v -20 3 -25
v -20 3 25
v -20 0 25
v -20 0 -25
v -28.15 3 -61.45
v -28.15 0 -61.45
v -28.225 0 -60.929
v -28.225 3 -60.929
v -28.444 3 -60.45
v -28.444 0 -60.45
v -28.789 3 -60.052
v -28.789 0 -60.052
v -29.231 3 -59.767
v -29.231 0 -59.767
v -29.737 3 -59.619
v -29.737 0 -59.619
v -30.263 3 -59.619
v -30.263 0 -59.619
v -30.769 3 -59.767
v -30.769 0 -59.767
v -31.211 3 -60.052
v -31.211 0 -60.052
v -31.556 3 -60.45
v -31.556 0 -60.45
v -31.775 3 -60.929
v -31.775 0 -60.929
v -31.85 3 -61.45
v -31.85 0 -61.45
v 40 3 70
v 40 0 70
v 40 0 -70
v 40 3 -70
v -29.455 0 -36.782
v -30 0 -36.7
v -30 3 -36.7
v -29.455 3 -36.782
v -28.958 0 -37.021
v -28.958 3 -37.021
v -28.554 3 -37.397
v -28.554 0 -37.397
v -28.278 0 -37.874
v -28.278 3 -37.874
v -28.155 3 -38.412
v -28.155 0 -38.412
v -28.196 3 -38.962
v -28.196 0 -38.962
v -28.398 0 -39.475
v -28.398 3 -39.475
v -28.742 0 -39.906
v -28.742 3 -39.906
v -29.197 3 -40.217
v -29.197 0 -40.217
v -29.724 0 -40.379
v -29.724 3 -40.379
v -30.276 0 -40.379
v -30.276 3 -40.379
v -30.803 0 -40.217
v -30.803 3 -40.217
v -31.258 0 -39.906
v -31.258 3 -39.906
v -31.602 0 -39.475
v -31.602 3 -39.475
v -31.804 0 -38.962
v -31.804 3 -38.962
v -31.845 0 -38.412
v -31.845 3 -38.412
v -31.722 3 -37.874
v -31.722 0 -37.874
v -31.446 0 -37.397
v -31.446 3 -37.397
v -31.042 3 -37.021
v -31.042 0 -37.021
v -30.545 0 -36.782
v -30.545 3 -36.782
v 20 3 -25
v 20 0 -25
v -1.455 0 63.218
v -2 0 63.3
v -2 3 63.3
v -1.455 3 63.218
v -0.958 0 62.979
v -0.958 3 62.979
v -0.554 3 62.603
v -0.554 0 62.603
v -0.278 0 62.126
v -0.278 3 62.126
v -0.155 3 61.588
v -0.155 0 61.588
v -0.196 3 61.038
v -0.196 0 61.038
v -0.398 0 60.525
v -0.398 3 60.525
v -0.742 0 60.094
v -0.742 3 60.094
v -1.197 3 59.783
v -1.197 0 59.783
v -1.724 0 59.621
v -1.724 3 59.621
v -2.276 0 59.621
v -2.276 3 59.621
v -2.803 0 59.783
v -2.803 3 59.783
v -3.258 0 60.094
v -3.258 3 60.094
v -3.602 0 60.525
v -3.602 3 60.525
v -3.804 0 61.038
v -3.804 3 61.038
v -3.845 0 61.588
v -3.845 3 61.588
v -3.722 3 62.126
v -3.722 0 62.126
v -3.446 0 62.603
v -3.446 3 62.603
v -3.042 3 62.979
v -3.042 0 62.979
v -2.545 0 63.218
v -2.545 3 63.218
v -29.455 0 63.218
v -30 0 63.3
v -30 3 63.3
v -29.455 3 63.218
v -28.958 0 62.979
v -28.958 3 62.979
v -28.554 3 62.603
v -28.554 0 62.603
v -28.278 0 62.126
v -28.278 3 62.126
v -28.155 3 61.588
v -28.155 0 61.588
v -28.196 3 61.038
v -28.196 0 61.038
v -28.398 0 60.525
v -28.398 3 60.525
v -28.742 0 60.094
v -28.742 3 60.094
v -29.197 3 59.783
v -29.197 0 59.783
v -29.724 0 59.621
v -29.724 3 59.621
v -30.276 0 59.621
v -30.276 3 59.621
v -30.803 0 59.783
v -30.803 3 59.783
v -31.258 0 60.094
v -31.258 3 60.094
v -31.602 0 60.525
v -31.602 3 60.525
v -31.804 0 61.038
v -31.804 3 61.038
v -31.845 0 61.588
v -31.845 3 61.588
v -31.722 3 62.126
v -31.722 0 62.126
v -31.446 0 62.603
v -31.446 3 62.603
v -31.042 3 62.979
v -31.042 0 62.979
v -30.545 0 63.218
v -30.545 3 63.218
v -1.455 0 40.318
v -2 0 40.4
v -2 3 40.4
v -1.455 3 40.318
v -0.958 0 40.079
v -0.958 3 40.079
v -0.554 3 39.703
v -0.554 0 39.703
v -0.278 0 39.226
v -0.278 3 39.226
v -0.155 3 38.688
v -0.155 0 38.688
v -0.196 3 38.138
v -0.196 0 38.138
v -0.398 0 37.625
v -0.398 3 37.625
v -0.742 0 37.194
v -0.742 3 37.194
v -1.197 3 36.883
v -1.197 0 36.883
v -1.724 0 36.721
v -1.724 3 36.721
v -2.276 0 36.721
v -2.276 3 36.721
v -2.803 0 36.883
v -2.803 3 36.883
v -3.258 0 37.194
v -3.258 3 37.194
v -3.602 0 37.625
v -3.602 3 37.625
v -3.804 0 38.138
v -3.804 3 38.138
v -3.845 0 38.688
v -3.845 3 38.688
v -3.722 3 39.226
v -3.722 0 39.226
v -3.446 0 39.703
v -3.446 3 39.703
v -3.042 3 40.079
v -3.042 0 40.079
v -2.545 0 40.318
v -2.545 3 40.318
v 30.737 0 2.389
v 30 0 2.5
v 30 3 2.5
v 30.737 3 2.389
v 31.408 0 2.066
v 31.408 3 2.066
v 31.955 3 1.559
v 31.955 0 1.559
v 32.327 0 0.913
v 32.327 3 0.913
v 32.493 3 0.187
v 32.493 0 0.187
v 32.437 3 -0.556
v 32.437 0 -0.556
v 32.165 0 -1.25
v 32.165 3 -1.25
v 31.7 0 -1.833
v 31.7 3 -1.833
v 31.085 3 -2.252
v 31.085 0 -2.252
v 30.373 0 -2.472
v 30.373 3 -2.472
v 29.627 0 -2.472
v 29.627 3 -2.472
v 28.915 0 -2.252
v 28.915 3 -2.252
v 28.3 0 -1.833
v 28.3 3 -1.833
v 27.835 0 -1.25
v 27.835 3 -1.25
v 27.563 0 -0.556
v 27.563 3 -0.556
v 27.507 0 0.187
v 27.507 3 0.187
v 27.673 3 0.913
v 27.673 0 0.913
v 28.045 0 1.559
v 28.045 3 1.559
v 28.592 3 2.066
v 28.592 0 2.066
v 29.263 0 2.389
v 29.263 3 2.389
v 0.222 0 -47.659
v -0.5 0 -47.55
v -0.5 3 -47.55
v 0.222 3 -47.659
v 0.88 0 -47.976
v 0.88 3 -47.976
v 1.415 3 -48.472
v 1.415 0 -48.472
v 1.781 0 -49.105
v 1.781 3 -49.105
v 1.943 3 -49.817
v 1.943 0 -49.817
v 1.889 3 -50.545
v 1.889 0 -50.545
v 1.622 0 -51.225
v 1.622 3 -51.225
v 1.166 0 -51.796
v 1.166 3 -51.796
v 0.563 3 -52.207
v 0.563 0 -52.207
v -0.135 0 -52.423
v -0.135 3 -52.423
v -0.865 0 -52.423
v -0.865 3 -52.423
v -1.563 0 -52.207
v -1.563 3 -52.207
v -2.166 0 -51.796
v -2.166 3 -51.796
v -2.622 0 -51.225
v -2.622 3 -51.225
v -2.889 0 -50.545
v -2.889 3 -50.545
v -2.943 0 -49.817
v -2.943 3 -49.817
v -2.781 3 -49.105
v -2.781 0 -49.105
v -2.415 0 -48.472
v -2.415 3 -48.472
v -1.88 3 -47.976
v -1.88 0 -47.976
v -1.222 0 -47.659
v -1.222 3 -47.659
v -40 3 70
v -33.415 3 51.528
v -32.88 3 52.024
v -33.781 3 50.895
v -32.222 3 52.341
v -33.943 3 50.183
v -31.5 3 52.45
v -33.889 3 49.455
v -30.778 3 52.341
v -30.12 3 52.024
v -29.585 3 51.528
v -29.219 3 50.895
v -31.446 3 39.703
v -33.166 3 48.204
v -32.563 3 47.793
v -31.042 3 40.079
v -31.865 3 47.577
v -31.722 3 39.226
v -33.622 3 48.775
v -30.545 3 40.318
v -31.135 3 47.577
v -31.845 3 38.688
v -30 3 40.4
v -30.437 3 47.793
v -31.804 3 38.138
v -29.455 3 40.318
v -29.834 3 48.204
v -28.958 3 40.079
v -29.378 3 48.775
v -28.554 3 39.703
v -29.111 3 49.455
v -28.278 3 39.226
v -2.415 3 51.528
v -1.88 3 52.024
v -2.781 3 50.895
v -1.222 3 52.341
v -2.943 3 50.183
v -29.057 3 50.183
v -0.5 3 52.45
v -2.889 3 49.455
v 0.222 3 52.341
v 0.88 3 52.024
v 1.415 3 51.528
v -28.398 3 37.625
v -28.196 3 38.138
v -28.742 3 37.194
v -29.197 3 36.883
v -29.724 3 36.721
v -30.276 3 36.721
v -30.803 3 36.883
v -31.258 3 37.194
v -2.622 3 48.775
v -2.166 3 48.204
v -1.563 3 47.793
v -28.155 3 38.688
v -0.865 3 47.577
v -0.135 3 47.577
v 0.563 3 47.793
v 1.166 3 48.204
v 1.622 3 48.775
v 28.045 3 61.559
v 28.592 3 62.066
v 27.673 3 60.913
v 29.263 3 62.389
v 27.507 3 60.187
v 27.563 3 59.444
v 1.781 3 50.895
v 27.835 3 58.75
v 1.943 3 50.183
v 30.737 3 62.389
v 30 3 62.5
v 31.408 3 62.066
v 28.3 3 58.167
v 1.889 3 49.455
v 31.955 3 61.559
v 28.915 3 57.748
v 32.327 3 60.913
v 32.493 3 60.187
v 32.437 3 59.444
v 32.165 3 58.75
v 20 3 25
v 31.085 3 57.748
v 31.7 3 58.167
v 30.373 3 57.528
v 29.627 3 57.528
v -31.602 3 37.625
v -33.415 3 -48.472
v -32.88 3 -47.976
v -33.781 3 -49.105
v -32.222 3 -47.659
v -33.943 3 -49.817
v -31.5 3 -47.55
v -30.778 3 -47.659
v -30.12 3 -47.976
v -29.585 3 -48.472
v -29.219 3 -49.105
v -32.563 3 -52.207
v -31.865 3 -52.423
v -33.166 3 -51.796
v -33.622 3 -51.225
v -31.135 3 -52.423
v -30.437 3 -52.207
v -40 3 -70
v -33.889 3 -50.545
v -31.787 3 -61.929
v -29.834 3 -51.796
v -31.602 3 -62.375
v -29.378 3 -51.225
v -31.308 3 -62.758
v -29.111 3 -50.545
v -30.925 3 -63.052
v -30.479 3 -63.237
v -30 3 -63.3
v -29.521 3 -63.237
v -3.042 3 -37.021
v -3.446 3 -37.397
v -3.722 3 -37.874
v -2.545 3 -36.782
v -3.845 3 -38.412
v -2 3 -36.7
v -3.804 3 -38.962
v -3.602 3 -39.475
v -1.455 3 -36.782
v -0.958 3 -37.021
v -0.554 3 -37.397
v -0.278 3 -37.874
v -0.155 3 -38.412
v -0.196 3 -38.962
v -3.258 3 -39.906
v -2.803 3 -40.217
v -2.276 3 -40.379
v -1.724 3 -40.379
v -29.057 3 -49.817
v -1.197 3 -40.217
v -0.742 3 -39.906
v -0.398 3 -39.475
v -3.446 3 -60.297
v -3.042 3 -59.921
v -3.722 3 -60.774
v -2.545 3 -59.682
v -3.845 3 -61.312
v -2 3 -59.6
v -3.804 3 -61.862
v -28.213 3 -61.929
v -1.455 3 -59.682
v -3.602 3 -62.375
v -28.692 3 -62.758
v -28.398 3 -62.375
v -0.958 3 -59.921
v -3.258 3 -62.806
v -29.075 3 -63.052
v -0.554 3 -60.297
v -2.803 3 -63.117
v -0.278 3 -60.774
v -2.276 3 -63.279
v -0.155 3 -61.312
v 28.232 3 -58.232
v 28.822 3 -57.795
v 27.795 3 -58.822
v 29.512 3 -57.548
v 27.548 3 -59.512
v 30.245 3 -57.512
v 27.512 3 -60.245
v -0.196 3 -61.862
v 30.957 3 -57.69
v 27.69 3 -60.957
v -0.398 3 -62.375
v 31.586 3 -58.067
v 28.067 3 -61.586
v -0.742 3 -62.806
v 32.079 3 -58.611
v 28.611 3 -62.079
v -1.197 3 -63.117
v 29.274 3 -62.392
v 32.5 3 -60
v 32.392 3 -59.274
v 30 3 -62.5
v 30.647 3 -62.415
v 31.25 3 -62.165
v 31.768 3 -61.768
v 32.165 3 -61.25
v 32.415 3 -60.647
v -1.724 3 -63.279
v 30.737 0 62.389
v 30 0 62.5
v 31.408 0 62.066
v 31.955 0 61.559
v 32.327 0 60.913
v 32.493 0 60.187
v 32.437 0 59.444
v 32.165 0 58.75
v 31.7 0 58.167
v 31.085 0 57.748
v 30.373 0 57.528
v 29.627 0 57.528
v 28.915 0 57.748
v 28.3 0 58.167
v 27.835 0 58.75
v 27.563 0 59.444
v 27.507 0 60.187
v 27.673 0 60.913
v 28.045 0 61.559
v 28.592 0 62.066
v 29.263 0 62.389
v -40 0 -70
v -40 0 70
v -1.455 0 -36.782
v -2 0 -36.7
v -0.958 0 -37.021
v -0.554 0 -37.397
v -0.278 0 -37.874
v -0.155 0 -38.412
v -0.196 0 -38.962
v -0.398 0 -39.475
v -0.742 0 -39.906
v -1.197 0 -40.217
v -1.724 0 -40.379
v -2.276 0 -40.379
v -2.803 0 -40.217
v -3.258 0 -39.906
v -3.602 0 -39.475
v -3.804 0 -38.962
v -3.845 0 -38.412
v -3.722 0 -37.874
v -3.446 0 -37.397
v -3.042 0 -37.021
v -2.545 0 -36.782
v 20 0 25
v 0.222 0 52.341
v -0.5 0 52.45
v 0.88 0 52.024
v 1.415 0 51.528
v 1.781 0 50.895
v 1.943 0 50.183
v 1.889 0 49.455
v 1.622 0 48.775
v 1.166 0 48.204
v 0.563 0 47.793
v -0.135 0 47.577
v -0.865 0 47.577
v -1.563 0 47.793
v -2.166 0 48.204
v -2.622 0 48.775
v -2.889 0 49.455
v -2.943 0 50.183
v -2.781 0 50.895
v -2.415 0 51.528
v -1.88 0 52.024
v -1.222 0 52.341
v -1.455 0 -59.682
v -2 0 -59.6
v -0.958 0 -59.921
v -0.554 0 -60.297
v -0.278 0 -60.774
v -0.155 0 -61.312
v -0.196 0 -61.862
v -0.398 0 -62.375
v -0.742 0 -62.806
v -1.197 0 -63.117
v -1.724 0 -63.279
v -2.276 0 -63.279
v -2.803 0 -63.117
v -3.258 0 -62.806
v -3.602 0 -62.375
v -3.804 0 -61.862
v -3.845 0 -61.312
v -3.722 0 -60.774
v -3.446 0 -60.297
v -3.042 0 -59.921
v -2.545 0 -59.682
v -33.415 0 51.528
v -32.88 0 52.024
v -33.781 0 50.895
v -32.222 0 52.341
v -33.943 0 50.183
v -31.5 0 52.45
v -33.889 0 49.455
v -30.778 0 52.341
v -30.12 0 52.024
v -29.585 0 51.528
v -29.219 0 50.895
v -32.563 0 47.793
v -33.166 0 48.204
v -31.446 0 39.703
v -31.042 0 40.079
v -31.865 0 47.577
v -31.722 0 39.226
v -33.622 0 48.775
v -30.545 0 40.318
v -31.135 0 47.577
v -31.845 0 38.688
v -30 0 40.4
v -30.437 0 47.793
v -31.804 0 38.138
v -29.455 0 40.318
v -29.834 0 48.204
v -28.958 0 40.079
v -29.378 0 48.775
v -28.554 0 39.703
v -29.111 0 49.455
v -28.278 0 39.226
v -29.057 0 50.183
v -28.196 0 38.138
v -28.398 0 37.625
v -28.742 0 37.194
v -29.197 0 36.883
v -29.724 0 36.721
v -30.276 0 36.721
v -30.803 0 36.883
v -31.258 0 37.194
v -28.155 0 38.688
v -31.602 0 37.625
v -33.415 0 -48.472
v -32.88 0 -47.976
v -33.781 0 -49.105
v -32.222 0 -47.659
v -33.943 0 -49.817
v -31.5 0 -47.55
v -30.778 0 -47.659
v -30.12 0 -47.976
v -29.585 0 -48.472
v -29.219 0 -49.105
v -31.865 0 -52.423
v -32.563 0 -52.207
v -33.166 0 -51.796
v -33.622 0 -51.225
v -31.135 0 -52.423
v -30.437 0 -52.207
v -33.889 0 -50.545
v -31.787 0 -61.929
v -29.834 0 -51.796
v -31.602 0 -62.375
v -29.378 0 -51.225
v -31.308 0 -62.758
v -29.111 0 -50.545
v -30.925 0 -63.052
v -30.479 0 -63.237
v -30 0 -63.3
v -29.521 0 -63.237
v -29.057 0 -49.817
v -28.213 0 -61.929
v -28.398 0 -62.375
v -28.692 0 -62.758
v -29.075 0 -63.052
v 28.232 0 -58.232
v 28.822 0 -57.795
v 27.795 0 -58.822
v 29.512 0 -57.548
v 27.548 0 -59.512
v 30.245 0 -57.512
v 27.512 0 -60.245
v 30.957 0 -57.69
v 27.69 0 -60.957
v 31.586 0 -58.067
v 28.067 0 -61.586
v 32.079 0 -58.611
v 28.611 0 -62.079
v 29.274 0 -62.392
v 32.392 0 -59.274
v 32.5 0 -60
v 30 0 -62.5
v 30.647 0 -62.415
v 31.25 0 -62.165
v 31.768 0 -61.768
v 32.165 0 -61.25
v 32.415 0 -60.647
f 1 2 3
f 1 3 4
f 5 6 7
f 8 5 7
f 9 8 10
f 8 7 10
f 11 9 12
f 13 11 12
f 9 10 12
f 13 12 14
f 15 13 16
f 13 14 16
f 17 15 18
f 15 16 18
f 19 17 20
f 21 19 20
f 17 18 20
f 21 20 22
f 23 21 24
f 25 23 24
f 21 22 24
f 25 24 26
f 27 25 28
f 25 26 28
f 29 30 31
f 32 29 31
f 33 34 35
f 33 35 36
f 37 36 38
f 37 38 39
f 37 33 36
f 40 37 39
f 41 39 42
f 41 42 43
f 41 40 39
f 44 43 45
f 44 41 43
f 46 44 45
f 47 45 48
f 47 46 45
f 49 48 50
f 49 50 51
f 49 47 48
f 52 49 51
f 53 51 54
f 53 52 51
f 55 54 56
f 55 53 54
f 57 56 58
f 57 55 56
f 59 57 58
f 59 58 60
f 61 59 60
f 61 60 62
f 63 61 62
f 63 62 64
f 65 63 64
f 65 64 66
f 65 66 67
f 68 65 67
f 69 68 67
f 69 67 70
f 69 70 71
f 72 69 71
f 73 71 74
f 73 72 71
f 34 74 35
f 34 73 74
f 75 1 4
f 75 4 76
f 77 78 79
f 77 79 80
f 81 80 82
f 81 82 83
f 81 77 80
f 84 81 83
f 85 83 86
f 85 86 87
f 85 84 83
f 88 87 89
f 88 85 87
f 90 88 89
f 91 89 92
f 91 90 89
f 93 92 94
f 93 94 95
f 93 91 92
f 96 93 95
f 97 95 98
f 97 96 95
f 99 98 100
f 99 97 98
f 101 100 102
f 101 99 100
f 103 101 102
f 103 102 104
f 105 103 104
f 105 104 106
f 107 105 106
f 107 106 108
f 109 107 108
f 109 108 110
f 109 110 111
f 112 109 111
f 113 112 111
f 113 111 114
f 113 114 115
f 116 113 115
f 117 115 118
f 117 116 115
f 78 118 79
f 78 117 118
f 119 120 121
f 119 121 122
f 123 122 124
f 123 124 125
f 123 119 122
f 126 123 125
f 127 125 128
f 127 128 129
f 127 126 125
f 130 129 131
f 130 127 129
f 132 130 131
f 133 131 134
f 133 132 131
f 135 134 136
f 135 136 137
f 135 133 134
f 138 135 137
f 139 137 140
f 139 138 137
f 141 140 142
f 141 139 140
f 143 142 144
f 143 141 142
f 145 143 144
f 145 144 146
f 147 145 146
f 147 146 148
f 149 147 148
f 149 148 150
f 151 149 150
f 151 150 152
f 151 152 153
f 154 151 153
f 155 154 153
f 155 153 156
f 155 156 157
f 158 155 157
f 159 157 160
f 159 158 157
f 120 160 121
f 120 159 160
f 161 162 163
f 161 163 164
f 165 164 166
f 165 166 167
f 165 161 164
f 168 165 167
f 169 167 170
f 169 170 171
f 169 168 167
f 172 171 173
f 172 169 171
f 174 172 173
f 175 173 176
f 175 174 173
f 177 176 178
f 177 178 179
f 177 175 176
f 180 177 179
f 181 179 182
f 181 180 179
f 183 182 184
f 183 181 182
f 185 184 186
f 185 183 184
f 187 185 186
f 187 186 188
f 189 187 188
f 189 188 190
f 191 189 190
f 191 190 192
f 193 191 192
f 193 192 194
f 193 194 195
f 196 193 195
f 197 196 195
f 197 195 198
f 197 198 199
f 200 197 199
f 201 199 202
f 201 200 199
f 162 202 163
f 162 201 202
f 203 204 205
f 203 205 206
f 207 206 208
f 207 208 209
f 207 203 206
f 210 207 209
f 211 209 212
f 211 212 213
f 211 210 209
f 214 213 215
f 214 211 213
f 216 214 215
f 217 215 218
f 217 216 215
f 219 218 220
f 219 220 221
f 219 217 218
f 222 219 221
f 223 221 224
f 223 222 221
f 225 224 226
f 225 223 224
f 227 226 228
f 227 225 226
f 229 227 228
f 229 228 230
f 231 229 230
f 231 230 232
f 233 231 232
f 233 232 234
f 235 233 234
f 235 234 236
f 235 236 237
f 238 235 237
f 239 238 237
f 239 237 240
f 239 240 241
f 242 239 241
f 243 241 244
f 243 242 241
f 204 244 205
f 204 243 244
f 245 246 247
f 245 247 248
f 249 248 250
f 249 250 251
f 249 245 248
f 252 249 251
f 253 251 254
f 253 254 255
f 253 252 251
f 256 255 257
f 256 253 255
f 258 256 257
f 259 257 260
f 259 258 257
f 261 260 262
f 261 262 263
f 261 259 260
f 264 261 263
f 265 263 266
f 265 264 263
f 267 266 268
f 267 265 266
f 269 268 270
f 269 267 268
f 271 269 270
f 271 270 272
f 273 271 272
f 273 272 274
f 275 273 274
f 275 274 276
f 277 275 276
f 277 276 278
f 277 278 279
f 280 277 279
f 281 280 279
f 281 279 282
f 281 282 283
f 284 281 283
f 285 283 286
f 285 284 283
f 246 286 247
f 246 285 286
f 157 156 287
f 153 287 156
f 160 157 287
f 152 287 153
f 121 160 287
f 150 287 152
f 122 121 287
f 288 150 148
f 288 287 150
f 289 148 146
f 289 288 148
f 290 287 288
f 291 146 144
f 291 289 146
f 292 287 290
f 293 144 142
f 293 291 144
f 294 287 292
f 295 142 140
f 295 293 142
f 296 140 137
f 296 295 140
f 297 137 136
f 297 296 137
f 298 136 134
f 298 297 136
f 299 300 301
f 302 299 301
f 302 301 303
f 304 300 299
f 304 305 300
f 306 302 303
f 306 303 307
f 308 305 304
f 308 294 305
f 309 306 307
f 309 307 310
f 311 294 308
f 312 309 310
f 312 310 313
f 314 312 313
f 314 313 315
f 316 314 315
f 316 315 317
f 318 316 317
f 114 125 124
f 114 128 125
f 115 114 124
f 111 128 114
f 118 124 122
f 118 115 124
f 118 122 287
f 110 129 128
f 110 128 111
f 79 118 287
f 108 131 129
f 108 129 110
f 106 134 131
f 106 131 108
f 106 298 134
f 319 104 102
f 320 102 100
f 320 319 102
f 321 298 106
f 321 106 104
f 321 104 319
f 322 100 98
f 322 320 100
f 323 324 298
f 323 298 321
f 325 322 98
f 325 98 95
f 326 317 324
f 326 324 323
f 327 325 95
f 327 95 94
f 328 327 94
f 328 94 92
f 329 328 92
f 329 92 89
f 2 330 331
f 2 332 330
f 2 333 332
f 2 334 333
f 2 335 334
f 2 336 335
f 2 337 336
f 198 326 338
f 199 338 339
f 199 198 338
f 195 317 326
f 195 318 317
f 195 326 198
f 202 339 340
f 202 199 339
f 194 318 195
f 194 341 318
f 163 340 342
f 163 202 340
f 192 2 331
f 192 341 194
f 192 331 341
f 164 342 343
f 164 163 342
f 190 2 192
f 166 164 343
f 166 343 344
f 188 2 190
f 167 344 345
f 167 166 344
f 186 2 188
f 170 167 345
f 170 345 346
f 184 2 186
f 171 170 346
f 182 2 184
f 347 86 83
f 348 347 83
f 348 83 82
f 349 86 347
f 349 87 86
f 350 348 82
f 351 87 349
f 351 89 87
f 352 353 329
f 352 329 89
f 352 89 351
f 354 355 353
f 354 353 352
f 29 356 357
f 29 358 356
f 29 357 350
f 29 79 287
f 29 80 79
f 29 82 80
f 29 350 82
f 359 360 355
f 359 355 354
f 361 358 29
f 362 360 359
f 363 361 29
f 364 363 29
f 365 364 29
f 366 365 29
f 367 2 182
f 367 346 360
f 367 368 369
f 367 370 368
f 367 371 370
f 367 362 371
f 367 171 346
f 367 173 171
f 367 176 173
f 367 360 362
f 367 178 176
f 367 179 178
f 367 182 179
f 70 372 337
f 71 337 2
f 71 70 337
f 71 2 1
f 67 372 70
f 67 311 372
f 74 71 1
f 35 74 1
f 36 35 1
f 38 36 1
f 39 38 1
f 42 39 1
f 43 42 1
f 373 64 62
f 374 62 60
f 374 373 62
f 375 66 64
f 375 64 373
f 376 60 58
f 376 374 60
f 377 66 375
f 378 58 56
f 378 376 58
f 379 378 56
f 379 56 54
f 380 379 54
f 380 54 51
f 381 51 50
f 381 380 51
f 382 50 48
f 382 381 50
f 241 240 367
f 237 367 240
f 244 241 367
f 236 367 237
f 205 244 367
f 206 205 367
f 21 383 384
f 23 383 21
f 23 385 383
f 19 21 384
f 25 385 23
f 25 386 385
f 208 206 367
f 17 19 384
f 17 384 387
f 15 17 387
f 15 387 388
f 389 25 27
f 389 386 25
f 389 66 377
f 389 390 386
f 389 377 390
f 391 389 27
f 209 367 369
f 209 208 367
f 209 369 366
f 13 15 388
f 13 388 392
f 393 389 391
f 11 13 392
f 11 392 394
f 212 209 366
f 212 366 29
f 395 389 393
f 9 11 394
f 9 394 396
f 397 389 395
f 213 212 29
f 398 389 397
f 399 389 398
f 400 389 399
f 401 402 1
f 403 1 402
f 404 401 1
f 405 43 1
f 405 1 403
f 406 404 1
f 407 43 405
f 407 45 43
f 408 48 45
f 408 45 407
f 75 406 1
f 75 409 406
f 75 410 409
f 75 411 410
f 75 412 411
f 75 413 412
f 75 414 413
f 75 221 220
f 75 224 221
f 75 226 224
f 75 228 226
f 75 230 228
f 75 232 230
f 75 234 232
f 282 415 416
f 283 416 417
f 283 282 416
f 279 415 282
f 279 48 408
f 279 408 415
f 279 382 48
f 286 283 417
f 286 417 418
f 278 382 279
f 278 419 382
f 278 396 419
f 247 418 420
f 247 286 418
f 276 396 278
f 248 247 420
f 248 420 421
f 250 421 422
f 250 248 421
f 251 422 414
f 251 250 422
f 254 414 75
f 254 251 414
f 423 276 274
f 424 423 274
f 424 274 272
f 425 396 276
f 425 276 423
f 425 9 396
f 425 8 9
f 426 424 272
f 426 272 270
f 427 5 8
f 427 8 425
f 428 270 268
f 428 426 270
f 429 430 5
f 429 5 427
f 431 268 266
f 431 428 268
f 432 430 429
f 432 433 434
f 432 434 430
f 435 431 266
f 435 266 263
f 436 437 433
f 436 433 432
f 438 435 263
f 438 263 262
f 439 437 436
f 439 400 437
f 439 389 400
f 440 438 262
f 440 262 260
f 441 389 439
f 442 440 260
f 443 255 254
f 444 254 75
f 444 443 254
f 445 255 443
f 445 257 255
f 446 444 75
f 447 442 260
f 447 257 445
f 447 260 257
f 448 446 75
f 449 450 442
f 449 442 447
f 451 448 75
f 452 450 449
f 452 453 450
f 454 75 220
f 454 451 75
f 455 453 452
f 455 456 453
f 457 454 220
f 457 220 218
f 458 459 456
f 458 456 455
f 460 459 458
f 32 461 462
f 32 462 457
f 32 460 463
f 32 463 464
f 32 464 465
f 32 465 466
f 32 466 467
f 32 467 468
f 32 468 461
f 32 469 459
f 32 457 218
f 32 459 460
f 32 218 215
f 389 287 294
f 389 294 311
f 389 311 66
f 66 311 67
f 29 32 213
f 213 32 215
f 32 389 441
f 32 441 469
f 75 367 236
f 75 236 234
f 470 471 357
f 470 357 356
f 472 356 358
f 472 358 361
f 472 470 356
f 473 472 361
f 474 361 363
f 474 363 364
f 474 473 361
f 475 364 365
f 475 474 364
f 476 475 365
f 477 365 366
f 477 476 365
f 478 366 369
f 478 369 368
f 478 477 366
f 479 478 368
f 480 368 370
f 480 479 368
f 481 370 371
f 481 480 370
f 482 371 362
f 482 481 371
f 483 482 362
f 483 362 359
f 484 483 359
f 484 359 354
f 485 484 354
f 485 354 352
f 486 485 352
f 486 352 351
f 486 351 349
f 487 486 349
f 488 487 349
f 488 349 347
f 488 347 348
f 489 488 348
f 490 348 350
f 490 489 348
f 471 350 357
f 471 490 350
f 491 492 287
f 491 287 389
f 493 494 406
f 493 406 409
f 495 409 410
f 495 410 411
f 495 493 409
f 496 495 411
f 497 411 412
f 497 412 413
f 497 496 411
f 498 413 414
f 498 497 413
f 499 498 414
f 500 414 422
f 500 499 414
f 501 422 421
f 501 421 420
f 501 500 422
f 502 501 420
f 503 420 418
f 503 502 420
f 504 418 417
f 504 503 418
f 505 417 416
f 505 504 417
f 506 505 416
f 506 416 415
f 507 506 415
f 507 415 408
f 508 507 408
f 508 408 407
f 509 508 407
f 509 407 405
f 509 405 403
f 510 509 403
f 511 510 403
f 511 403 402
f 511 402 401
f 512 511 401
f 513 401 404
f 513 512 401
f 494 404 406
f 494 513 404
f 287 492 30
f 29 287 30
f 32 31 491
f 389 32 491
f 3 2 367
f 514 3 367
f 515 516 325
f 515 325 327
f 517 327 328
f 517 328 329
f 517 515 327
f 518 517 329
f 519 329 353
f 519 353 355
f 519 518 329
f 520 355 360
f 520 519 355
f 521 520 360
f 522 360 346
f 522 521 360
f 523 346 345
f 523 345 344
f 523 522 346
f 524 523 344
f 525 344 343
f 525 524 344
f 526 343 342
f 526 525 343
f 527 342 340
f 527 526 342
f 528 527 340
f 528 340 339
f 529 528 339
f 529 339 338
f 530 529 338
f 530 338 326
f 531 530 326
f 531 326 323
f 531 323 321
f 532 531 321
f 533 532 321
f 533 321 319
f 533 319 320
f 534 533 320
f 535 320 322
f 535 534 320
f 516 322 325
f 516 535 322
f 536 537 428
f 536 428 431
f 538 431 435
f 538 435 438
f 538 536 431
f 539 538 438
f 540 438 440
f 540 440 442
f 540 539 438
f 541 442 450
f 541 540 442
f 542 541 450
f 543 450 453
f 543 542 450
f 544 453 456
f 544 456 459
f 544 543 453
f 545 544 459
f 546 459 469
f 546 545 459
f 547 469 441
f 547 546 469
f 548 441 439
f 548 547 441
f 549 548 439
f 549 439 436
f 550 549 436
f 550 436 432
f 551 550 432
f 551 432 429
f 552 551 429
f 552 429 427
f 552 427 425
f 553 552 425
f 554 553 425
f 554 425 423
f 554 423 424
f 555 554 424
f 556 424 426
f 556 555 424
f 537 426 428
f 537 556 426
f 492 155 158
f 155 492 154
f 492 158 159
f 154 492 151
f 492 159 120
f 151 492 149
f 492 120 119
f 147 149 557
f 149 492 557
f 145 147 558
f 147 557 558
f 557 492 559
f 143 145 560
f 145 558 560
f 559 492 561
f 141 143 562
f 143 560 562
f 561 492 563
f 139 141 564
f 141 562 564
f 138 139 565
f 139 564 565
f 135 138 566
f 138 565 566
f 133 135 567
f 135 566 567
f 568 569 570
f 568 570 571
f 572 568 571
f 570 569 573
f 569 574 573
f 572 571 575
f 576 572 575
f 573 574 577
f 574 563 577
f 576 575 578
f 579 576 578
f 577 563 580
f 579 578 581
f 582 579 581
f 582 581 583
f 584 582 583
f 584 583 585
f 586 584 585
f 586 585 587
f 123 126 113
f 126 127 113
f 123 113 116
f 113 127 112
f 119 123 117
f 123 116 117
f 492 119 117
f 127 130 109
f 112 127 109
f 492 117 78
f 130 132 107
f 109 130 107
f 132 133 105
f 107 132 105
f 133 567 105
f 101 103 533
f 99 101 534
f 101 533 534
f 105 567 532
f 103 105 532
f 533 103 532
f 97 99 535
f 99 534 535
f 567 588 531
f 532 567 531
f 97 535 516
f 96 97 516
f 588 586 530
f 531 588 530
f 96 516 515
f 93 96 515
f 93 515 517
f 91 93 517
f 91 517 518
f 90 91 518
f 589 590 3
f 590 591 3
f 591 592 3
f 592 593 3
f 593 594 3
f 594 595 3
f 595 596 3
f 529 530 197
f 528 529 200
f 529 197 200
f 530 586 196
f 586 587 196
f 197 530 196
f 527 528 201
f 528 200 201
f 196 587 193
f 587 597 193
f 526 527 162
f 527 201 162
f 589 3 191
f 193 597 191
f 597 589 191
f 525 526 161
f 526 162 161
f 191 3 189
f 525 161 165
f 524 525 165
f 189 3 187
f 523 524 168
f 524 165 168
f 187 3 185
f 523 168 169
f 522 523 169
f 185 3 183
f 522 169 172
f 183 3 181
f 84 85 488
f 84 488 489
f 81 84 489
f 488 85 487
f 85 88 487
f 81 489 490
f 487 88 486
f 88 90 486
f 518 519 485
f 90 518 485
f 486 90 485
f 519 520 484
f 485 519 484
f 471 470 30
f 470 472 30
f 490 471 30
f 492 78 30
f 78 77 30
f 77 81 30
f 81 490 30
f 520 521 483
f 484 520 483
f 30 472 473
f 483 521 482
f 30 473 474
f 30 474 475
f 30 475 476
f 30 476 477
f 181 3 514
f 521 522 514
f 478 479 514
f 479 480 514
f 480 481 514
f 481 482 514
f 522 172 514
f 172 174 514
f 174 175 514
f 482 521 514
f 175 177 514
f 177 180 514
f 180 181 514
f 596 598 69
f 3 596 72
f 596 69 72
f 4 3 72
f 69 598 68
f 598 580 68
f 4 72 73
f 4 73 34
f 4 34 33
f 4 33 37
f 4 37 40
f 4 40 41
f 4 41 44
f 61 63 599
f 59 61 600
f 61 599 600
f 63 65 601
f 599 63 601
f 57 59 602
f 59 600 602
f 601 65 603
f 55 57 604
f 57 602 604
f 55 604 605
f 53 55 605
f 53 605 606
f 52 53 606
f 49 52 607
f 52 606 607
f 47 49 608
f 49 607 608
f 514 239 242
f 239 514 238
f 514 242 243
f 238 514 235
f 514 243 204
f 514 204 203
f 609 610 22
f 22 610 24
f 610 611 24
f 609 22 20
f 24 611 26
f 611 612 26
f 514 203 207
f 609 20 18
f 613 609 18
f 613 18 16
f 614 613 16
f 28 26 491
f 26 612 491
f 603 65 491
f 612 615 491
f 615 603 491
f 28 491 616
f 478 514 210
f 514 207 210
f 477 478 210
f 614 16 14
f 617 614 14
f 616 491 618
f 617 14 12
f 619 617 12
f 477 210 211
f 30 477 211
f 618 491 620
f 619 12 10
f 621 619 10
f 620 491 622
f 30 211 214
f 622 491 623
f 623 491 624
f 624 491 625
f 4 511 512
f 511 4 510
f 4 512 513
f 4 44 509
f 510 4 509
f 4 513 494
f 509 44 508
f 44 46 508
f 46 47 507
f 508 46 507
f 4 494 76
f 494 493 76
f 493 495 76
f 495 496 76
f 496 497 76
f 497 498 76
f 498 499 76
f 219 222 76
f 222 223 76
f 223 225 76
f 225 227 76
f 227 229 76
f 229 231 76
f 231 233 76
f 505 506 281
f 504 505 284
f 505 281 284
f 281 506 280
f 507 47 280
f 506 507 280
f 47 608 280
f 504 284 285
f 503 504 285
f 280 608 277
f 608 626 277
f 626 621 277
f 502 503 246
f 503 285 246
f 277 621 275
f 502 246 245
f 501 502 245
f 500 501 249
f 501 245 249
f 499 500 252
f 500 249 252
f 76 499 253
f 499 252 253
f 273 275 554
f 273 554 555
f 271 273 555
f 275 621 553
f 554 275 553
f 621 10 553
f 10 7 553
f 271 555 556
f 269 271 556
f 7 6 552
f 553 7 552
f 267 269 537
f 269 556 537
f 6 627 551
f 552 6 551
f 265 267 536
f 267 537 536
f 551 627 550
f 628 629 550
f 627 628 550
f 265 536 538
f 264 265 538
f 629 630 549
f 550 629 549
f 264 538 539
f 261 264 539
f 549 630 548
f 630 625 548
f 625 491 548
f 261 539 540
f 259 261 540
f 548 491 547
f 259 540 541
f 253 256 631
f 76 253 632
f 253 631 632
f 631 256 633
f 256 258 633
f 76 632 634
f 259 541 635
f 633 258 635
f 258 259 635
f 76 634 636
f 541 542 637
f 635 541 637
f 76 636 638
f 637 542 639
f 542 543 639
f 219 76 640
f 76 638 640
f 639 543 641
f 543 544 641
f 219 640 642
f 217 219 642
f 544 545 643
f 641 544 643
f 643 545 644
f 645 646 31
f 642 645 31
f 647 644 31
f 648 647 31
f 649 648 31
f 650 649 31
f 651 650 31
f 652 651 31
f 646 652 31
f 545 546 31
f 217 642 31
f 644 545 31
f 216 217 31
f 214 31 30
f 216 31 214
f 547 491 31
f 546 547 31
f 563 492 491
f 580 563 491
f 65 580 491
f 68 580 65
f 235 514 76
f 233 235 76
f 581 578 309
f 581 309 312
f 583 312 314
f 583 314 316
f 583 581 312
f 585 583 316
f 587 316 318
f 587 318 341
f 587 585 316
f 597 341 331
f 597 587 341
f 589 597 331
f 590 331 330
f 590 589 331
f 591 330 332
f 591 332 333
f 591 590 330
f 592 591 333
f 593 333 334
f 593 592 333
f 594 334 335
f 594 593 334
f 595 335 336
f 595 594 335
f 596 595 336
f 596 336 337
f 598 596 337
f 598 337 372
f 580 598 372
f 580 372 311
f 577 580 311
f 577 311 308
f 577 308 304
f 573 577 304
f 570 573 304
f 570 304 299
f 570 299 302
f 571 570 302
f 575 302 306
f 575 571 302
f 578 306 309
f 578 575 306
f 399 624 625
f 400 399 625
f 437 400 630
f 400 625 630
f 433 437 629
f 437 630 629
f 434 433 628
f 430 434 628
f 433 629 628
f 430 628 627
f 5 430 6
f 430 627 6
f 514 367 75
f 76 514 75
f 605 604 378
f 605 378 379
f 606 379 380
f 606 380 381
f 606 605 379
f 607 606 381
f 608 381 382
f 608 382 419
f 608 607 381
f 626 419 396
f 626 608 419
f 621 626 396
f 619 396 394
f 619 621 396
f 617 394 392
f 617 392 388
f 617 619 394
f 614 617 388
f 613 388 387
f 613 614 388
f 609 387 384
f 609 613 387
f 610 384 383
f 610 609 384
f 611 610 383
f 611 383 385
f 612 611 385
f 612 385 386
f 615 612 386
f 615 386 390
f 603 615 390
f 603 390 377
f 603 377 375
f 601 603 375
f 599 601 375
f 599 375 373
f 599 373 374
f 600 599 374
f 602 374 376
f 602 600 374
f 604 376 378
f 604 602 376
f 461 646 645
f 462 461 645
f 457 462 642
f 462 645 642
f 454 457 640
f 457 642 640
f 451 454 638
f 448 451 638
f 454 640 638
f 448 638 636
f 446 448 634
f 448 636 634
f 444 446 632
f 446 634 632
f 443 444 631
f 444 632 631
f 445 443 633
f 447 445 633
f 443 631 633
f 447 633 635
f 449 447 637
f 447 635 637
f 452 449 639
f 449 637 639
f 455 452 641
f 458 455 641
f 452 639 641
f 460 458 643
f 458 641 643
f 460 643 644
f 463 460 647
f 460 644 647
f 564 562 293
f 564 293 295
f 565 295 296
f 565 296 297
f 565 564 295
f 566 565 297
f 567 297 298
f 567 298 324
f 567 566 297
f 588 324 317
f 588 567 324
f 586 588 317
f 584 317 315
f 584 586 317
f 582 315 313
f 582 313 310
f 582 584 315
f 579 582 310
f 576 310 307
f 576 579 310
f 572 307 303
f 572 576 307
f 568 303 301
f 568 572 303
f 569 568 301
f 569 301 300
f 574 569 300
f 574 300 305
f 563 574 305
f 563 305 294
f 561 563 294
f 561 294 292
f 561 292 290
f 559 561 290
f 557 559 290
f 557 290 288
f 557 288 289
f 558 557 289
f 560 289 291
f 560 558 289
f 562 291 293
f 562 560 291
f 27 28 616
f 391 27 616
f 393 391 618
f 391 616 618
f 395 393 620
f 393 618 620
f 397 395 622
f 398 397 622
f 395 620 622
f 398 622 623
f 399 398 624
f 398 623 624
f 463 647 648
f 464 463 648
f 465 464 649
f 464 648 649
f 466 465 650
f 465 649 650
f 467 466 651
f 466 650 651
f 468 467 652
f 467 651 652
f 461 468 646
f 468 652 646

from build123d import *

# Parameters (mm, degrees)
SKETCH_1_R          = 2.5
SKETCH_1_R_2        = 2.45
SKETCH_1_R_3        = 1.85
SKETCH_1_W          = 48
SKETCH_1_H          = 40
EXTRUDE_1_DEPTH     = 3
CUT_EXTRUDE_1_REACH = 82.678
SKETCH_2_W          = 40
SKETCH_2_H          = 50


with BuildPart() as part:
    # 草图1 → 凸台-拉伸1 (new body)
    # profile 1 of 5: a face of its own
    with BuildSketch(Plane(origin=(0, 0, 0), x_dir=(1, 0, 0), z_dir=(0, 1, 0))):
        with BuildLine():
            Line((8, -30), (8, -70))
            Line((8, -70), (40, -70))
            Line((40, -70), (40, 60))
            Line((40, 60), (32.5, 60))
            ThreePointArc((32.5, 60), (28.232233047, 58.232233047), (30, 62.5))
            Line((30, 62.5), (30, 70))
            Line((30, 70), (8, 70))
            Line((8, 70), (8, 30))
            Line((8, 30), (-40, 30))
            Line((-40, 30), (-40, -30))
            Line((-40, -30), (8, -30))
        make_face()
        with Locations(Location((30, -60, 0), (0, 0, 270))):
            Circle(SKETCH_1_R, mode=Mode.SUBTRACT)
        with Locations(Location((30, 0, 0), (0, 0, 270))):
            Circle(SKETCH_1_R, mode=Mode.SUBTRACT)
    # profile 2 of 5: a face of its own
    with BuildSketch(Plane(origin=(0, 0, 0), x_dir=(1, 0, 0), z_dir=(0, 1, 0))):
        with BuildLine():
            Line((32.5, 60), (40, 60))
            Line((40, 60), (40, 70))
            Line((40, 70), (30, 70))
            Line((30, 70), (30, 62.5))
            ThreePointArc((30, 62.5), (31.767766953, 61.767766953), (32.5, 60))
        make_face()
    # profile 3 of 5: a face of its own
    with BuildSketch(Plane(origin=(0, 0, 0), x_dir=(1, 0, 0), z_dir=(0, 1, 0))):
        with BuildLine():
            Line((-40, 61.45), (-40, 30))
            Line((-40, 30), (8, 30))
            Line((8, 30), (8, 70))
            Line((8, 70), (-30, 70))
            Line((-30, 70), (-30, 63.3))
            ThreePointArc((-30, 63.3), (-28.691852455, 62.758147545), (-28.15, 61.45))
            ThreePointArc((-28.15, 61.45), (-30, 59.6), (-31.85, 61.45))
            Line((-31.85, 61.45), (-40, 61.45))
        make_face()
        with Locations(Location((-31.5, 50, 0), (0, 0, 270))):
            Circle(SKETCH_1_R_2, mode=Mode.SUBTRACT)
        with Locations(Location((-30, 38.55, 0), (0, 0, 270))):
            Circle(SKETCH_1_R_3, mode=Mode.SUBTRACT)
        with Locations(Location((-2, 38.55, 0), (0, 0, 270))):
            Circle(SKETCH_1_R_3, mode=Mode.SUBTRACT)
        with Locations(Location((-0.5, 50, 0), (0, 0, 270))):
            Circle(SKETCH_1_R_2, mode=Mode.SUBTRACT)
        with Locations(Location((-2, 61.45, 0), (0, 0, 270))):
            Circle(SKETCH_1_R_3, mode=Mode.SUBTRACT)
    # profile 4 of 5: a face of its own
    with BuildSketch(Plane(origin=(0, 0, 0), x_dir=(1, 0, 0), z_dir=(0, 1, 0))):
        with BuildLine():
            Line((-40, 70), (-40, 61.45))
            Line((-40, 61.45), (-31.85, 61.45))
            ThreePointArc((-31.85, 61.45), (-31.308147545, 62.758147545), (-30, 63.3))
            Line((-30, 63.3), (-30, 70))
            Line((-30, 70), (-40, 70))
        make_face()
    # profile 5 of 5: a face of its own
    with BuildSketch(Plane(origin=(0, 0, 0), x_dir=(1, 0, 0), z_dir=(0, 1, 0))):
        with Locations((-16, -50)):
            Rectangle(SKETCH_1_W, SKETCH_1_H)
        with Locations(Location((-30, -61.45, 0), (0, 0, 270))):
            Circle(SKETCH_1_R_3, mode=Mode.SUBTRACT)
        with Locations(Location((-31.5, -50, 0), (0, 0, 270))):
            Circle(SKETCH_1_R_2, mode=Mode.SUBTRACT)
        with Locations(Location((-30, -38.55, 0), (0, 0, 270))):
            Circle(SKETCH_1_R_3, mode=Mode.SUBTRACT)
        with Locations(Location((-2, -61.45, 0), (0, 0, 270))):
            Circle(SKETCH_1_R_3, mode=Mode.SUBTRACT)
        with Locations(Location((-0.5, -50, 0), (0, 0, 270))):
            Circle(SKETCH_1_R_2, mode=Mode.SUBTRACT)
        with Locations(Location((-2, -38.55, 0), (0, 0, 270))):
            Circle(SKETCH_1_R_3, mode=Mode.SUBTRACT)
    extrude(amount=EXTRUDE_1_DEPTH)

    # 草图2 → 切除-拉伸1 (cut, up to next)
    with BuildSketch(Plane(origin=(0, 3, 0), x_dir=(1, 0, 0), z_dir=(0, 1, 0)), mode=Mode.PRIVATE) as cut_extrude_1_sk1:
        Rectangle(SKETCH_2_W, SKETCH_2_H)
    cut_extrude_1_tool1 = extrude(cut_extrude_1_sk1.sketch, amount=-CUT_EXTRUDE_1_REACH, mode=Mode.PRIVATE) & part.part
    add(cut_extrude_1_tool1.solids().sort_by_distance((0, 3, 0))[0], mode=Mode.SUBTRACT)


solid = part.part
